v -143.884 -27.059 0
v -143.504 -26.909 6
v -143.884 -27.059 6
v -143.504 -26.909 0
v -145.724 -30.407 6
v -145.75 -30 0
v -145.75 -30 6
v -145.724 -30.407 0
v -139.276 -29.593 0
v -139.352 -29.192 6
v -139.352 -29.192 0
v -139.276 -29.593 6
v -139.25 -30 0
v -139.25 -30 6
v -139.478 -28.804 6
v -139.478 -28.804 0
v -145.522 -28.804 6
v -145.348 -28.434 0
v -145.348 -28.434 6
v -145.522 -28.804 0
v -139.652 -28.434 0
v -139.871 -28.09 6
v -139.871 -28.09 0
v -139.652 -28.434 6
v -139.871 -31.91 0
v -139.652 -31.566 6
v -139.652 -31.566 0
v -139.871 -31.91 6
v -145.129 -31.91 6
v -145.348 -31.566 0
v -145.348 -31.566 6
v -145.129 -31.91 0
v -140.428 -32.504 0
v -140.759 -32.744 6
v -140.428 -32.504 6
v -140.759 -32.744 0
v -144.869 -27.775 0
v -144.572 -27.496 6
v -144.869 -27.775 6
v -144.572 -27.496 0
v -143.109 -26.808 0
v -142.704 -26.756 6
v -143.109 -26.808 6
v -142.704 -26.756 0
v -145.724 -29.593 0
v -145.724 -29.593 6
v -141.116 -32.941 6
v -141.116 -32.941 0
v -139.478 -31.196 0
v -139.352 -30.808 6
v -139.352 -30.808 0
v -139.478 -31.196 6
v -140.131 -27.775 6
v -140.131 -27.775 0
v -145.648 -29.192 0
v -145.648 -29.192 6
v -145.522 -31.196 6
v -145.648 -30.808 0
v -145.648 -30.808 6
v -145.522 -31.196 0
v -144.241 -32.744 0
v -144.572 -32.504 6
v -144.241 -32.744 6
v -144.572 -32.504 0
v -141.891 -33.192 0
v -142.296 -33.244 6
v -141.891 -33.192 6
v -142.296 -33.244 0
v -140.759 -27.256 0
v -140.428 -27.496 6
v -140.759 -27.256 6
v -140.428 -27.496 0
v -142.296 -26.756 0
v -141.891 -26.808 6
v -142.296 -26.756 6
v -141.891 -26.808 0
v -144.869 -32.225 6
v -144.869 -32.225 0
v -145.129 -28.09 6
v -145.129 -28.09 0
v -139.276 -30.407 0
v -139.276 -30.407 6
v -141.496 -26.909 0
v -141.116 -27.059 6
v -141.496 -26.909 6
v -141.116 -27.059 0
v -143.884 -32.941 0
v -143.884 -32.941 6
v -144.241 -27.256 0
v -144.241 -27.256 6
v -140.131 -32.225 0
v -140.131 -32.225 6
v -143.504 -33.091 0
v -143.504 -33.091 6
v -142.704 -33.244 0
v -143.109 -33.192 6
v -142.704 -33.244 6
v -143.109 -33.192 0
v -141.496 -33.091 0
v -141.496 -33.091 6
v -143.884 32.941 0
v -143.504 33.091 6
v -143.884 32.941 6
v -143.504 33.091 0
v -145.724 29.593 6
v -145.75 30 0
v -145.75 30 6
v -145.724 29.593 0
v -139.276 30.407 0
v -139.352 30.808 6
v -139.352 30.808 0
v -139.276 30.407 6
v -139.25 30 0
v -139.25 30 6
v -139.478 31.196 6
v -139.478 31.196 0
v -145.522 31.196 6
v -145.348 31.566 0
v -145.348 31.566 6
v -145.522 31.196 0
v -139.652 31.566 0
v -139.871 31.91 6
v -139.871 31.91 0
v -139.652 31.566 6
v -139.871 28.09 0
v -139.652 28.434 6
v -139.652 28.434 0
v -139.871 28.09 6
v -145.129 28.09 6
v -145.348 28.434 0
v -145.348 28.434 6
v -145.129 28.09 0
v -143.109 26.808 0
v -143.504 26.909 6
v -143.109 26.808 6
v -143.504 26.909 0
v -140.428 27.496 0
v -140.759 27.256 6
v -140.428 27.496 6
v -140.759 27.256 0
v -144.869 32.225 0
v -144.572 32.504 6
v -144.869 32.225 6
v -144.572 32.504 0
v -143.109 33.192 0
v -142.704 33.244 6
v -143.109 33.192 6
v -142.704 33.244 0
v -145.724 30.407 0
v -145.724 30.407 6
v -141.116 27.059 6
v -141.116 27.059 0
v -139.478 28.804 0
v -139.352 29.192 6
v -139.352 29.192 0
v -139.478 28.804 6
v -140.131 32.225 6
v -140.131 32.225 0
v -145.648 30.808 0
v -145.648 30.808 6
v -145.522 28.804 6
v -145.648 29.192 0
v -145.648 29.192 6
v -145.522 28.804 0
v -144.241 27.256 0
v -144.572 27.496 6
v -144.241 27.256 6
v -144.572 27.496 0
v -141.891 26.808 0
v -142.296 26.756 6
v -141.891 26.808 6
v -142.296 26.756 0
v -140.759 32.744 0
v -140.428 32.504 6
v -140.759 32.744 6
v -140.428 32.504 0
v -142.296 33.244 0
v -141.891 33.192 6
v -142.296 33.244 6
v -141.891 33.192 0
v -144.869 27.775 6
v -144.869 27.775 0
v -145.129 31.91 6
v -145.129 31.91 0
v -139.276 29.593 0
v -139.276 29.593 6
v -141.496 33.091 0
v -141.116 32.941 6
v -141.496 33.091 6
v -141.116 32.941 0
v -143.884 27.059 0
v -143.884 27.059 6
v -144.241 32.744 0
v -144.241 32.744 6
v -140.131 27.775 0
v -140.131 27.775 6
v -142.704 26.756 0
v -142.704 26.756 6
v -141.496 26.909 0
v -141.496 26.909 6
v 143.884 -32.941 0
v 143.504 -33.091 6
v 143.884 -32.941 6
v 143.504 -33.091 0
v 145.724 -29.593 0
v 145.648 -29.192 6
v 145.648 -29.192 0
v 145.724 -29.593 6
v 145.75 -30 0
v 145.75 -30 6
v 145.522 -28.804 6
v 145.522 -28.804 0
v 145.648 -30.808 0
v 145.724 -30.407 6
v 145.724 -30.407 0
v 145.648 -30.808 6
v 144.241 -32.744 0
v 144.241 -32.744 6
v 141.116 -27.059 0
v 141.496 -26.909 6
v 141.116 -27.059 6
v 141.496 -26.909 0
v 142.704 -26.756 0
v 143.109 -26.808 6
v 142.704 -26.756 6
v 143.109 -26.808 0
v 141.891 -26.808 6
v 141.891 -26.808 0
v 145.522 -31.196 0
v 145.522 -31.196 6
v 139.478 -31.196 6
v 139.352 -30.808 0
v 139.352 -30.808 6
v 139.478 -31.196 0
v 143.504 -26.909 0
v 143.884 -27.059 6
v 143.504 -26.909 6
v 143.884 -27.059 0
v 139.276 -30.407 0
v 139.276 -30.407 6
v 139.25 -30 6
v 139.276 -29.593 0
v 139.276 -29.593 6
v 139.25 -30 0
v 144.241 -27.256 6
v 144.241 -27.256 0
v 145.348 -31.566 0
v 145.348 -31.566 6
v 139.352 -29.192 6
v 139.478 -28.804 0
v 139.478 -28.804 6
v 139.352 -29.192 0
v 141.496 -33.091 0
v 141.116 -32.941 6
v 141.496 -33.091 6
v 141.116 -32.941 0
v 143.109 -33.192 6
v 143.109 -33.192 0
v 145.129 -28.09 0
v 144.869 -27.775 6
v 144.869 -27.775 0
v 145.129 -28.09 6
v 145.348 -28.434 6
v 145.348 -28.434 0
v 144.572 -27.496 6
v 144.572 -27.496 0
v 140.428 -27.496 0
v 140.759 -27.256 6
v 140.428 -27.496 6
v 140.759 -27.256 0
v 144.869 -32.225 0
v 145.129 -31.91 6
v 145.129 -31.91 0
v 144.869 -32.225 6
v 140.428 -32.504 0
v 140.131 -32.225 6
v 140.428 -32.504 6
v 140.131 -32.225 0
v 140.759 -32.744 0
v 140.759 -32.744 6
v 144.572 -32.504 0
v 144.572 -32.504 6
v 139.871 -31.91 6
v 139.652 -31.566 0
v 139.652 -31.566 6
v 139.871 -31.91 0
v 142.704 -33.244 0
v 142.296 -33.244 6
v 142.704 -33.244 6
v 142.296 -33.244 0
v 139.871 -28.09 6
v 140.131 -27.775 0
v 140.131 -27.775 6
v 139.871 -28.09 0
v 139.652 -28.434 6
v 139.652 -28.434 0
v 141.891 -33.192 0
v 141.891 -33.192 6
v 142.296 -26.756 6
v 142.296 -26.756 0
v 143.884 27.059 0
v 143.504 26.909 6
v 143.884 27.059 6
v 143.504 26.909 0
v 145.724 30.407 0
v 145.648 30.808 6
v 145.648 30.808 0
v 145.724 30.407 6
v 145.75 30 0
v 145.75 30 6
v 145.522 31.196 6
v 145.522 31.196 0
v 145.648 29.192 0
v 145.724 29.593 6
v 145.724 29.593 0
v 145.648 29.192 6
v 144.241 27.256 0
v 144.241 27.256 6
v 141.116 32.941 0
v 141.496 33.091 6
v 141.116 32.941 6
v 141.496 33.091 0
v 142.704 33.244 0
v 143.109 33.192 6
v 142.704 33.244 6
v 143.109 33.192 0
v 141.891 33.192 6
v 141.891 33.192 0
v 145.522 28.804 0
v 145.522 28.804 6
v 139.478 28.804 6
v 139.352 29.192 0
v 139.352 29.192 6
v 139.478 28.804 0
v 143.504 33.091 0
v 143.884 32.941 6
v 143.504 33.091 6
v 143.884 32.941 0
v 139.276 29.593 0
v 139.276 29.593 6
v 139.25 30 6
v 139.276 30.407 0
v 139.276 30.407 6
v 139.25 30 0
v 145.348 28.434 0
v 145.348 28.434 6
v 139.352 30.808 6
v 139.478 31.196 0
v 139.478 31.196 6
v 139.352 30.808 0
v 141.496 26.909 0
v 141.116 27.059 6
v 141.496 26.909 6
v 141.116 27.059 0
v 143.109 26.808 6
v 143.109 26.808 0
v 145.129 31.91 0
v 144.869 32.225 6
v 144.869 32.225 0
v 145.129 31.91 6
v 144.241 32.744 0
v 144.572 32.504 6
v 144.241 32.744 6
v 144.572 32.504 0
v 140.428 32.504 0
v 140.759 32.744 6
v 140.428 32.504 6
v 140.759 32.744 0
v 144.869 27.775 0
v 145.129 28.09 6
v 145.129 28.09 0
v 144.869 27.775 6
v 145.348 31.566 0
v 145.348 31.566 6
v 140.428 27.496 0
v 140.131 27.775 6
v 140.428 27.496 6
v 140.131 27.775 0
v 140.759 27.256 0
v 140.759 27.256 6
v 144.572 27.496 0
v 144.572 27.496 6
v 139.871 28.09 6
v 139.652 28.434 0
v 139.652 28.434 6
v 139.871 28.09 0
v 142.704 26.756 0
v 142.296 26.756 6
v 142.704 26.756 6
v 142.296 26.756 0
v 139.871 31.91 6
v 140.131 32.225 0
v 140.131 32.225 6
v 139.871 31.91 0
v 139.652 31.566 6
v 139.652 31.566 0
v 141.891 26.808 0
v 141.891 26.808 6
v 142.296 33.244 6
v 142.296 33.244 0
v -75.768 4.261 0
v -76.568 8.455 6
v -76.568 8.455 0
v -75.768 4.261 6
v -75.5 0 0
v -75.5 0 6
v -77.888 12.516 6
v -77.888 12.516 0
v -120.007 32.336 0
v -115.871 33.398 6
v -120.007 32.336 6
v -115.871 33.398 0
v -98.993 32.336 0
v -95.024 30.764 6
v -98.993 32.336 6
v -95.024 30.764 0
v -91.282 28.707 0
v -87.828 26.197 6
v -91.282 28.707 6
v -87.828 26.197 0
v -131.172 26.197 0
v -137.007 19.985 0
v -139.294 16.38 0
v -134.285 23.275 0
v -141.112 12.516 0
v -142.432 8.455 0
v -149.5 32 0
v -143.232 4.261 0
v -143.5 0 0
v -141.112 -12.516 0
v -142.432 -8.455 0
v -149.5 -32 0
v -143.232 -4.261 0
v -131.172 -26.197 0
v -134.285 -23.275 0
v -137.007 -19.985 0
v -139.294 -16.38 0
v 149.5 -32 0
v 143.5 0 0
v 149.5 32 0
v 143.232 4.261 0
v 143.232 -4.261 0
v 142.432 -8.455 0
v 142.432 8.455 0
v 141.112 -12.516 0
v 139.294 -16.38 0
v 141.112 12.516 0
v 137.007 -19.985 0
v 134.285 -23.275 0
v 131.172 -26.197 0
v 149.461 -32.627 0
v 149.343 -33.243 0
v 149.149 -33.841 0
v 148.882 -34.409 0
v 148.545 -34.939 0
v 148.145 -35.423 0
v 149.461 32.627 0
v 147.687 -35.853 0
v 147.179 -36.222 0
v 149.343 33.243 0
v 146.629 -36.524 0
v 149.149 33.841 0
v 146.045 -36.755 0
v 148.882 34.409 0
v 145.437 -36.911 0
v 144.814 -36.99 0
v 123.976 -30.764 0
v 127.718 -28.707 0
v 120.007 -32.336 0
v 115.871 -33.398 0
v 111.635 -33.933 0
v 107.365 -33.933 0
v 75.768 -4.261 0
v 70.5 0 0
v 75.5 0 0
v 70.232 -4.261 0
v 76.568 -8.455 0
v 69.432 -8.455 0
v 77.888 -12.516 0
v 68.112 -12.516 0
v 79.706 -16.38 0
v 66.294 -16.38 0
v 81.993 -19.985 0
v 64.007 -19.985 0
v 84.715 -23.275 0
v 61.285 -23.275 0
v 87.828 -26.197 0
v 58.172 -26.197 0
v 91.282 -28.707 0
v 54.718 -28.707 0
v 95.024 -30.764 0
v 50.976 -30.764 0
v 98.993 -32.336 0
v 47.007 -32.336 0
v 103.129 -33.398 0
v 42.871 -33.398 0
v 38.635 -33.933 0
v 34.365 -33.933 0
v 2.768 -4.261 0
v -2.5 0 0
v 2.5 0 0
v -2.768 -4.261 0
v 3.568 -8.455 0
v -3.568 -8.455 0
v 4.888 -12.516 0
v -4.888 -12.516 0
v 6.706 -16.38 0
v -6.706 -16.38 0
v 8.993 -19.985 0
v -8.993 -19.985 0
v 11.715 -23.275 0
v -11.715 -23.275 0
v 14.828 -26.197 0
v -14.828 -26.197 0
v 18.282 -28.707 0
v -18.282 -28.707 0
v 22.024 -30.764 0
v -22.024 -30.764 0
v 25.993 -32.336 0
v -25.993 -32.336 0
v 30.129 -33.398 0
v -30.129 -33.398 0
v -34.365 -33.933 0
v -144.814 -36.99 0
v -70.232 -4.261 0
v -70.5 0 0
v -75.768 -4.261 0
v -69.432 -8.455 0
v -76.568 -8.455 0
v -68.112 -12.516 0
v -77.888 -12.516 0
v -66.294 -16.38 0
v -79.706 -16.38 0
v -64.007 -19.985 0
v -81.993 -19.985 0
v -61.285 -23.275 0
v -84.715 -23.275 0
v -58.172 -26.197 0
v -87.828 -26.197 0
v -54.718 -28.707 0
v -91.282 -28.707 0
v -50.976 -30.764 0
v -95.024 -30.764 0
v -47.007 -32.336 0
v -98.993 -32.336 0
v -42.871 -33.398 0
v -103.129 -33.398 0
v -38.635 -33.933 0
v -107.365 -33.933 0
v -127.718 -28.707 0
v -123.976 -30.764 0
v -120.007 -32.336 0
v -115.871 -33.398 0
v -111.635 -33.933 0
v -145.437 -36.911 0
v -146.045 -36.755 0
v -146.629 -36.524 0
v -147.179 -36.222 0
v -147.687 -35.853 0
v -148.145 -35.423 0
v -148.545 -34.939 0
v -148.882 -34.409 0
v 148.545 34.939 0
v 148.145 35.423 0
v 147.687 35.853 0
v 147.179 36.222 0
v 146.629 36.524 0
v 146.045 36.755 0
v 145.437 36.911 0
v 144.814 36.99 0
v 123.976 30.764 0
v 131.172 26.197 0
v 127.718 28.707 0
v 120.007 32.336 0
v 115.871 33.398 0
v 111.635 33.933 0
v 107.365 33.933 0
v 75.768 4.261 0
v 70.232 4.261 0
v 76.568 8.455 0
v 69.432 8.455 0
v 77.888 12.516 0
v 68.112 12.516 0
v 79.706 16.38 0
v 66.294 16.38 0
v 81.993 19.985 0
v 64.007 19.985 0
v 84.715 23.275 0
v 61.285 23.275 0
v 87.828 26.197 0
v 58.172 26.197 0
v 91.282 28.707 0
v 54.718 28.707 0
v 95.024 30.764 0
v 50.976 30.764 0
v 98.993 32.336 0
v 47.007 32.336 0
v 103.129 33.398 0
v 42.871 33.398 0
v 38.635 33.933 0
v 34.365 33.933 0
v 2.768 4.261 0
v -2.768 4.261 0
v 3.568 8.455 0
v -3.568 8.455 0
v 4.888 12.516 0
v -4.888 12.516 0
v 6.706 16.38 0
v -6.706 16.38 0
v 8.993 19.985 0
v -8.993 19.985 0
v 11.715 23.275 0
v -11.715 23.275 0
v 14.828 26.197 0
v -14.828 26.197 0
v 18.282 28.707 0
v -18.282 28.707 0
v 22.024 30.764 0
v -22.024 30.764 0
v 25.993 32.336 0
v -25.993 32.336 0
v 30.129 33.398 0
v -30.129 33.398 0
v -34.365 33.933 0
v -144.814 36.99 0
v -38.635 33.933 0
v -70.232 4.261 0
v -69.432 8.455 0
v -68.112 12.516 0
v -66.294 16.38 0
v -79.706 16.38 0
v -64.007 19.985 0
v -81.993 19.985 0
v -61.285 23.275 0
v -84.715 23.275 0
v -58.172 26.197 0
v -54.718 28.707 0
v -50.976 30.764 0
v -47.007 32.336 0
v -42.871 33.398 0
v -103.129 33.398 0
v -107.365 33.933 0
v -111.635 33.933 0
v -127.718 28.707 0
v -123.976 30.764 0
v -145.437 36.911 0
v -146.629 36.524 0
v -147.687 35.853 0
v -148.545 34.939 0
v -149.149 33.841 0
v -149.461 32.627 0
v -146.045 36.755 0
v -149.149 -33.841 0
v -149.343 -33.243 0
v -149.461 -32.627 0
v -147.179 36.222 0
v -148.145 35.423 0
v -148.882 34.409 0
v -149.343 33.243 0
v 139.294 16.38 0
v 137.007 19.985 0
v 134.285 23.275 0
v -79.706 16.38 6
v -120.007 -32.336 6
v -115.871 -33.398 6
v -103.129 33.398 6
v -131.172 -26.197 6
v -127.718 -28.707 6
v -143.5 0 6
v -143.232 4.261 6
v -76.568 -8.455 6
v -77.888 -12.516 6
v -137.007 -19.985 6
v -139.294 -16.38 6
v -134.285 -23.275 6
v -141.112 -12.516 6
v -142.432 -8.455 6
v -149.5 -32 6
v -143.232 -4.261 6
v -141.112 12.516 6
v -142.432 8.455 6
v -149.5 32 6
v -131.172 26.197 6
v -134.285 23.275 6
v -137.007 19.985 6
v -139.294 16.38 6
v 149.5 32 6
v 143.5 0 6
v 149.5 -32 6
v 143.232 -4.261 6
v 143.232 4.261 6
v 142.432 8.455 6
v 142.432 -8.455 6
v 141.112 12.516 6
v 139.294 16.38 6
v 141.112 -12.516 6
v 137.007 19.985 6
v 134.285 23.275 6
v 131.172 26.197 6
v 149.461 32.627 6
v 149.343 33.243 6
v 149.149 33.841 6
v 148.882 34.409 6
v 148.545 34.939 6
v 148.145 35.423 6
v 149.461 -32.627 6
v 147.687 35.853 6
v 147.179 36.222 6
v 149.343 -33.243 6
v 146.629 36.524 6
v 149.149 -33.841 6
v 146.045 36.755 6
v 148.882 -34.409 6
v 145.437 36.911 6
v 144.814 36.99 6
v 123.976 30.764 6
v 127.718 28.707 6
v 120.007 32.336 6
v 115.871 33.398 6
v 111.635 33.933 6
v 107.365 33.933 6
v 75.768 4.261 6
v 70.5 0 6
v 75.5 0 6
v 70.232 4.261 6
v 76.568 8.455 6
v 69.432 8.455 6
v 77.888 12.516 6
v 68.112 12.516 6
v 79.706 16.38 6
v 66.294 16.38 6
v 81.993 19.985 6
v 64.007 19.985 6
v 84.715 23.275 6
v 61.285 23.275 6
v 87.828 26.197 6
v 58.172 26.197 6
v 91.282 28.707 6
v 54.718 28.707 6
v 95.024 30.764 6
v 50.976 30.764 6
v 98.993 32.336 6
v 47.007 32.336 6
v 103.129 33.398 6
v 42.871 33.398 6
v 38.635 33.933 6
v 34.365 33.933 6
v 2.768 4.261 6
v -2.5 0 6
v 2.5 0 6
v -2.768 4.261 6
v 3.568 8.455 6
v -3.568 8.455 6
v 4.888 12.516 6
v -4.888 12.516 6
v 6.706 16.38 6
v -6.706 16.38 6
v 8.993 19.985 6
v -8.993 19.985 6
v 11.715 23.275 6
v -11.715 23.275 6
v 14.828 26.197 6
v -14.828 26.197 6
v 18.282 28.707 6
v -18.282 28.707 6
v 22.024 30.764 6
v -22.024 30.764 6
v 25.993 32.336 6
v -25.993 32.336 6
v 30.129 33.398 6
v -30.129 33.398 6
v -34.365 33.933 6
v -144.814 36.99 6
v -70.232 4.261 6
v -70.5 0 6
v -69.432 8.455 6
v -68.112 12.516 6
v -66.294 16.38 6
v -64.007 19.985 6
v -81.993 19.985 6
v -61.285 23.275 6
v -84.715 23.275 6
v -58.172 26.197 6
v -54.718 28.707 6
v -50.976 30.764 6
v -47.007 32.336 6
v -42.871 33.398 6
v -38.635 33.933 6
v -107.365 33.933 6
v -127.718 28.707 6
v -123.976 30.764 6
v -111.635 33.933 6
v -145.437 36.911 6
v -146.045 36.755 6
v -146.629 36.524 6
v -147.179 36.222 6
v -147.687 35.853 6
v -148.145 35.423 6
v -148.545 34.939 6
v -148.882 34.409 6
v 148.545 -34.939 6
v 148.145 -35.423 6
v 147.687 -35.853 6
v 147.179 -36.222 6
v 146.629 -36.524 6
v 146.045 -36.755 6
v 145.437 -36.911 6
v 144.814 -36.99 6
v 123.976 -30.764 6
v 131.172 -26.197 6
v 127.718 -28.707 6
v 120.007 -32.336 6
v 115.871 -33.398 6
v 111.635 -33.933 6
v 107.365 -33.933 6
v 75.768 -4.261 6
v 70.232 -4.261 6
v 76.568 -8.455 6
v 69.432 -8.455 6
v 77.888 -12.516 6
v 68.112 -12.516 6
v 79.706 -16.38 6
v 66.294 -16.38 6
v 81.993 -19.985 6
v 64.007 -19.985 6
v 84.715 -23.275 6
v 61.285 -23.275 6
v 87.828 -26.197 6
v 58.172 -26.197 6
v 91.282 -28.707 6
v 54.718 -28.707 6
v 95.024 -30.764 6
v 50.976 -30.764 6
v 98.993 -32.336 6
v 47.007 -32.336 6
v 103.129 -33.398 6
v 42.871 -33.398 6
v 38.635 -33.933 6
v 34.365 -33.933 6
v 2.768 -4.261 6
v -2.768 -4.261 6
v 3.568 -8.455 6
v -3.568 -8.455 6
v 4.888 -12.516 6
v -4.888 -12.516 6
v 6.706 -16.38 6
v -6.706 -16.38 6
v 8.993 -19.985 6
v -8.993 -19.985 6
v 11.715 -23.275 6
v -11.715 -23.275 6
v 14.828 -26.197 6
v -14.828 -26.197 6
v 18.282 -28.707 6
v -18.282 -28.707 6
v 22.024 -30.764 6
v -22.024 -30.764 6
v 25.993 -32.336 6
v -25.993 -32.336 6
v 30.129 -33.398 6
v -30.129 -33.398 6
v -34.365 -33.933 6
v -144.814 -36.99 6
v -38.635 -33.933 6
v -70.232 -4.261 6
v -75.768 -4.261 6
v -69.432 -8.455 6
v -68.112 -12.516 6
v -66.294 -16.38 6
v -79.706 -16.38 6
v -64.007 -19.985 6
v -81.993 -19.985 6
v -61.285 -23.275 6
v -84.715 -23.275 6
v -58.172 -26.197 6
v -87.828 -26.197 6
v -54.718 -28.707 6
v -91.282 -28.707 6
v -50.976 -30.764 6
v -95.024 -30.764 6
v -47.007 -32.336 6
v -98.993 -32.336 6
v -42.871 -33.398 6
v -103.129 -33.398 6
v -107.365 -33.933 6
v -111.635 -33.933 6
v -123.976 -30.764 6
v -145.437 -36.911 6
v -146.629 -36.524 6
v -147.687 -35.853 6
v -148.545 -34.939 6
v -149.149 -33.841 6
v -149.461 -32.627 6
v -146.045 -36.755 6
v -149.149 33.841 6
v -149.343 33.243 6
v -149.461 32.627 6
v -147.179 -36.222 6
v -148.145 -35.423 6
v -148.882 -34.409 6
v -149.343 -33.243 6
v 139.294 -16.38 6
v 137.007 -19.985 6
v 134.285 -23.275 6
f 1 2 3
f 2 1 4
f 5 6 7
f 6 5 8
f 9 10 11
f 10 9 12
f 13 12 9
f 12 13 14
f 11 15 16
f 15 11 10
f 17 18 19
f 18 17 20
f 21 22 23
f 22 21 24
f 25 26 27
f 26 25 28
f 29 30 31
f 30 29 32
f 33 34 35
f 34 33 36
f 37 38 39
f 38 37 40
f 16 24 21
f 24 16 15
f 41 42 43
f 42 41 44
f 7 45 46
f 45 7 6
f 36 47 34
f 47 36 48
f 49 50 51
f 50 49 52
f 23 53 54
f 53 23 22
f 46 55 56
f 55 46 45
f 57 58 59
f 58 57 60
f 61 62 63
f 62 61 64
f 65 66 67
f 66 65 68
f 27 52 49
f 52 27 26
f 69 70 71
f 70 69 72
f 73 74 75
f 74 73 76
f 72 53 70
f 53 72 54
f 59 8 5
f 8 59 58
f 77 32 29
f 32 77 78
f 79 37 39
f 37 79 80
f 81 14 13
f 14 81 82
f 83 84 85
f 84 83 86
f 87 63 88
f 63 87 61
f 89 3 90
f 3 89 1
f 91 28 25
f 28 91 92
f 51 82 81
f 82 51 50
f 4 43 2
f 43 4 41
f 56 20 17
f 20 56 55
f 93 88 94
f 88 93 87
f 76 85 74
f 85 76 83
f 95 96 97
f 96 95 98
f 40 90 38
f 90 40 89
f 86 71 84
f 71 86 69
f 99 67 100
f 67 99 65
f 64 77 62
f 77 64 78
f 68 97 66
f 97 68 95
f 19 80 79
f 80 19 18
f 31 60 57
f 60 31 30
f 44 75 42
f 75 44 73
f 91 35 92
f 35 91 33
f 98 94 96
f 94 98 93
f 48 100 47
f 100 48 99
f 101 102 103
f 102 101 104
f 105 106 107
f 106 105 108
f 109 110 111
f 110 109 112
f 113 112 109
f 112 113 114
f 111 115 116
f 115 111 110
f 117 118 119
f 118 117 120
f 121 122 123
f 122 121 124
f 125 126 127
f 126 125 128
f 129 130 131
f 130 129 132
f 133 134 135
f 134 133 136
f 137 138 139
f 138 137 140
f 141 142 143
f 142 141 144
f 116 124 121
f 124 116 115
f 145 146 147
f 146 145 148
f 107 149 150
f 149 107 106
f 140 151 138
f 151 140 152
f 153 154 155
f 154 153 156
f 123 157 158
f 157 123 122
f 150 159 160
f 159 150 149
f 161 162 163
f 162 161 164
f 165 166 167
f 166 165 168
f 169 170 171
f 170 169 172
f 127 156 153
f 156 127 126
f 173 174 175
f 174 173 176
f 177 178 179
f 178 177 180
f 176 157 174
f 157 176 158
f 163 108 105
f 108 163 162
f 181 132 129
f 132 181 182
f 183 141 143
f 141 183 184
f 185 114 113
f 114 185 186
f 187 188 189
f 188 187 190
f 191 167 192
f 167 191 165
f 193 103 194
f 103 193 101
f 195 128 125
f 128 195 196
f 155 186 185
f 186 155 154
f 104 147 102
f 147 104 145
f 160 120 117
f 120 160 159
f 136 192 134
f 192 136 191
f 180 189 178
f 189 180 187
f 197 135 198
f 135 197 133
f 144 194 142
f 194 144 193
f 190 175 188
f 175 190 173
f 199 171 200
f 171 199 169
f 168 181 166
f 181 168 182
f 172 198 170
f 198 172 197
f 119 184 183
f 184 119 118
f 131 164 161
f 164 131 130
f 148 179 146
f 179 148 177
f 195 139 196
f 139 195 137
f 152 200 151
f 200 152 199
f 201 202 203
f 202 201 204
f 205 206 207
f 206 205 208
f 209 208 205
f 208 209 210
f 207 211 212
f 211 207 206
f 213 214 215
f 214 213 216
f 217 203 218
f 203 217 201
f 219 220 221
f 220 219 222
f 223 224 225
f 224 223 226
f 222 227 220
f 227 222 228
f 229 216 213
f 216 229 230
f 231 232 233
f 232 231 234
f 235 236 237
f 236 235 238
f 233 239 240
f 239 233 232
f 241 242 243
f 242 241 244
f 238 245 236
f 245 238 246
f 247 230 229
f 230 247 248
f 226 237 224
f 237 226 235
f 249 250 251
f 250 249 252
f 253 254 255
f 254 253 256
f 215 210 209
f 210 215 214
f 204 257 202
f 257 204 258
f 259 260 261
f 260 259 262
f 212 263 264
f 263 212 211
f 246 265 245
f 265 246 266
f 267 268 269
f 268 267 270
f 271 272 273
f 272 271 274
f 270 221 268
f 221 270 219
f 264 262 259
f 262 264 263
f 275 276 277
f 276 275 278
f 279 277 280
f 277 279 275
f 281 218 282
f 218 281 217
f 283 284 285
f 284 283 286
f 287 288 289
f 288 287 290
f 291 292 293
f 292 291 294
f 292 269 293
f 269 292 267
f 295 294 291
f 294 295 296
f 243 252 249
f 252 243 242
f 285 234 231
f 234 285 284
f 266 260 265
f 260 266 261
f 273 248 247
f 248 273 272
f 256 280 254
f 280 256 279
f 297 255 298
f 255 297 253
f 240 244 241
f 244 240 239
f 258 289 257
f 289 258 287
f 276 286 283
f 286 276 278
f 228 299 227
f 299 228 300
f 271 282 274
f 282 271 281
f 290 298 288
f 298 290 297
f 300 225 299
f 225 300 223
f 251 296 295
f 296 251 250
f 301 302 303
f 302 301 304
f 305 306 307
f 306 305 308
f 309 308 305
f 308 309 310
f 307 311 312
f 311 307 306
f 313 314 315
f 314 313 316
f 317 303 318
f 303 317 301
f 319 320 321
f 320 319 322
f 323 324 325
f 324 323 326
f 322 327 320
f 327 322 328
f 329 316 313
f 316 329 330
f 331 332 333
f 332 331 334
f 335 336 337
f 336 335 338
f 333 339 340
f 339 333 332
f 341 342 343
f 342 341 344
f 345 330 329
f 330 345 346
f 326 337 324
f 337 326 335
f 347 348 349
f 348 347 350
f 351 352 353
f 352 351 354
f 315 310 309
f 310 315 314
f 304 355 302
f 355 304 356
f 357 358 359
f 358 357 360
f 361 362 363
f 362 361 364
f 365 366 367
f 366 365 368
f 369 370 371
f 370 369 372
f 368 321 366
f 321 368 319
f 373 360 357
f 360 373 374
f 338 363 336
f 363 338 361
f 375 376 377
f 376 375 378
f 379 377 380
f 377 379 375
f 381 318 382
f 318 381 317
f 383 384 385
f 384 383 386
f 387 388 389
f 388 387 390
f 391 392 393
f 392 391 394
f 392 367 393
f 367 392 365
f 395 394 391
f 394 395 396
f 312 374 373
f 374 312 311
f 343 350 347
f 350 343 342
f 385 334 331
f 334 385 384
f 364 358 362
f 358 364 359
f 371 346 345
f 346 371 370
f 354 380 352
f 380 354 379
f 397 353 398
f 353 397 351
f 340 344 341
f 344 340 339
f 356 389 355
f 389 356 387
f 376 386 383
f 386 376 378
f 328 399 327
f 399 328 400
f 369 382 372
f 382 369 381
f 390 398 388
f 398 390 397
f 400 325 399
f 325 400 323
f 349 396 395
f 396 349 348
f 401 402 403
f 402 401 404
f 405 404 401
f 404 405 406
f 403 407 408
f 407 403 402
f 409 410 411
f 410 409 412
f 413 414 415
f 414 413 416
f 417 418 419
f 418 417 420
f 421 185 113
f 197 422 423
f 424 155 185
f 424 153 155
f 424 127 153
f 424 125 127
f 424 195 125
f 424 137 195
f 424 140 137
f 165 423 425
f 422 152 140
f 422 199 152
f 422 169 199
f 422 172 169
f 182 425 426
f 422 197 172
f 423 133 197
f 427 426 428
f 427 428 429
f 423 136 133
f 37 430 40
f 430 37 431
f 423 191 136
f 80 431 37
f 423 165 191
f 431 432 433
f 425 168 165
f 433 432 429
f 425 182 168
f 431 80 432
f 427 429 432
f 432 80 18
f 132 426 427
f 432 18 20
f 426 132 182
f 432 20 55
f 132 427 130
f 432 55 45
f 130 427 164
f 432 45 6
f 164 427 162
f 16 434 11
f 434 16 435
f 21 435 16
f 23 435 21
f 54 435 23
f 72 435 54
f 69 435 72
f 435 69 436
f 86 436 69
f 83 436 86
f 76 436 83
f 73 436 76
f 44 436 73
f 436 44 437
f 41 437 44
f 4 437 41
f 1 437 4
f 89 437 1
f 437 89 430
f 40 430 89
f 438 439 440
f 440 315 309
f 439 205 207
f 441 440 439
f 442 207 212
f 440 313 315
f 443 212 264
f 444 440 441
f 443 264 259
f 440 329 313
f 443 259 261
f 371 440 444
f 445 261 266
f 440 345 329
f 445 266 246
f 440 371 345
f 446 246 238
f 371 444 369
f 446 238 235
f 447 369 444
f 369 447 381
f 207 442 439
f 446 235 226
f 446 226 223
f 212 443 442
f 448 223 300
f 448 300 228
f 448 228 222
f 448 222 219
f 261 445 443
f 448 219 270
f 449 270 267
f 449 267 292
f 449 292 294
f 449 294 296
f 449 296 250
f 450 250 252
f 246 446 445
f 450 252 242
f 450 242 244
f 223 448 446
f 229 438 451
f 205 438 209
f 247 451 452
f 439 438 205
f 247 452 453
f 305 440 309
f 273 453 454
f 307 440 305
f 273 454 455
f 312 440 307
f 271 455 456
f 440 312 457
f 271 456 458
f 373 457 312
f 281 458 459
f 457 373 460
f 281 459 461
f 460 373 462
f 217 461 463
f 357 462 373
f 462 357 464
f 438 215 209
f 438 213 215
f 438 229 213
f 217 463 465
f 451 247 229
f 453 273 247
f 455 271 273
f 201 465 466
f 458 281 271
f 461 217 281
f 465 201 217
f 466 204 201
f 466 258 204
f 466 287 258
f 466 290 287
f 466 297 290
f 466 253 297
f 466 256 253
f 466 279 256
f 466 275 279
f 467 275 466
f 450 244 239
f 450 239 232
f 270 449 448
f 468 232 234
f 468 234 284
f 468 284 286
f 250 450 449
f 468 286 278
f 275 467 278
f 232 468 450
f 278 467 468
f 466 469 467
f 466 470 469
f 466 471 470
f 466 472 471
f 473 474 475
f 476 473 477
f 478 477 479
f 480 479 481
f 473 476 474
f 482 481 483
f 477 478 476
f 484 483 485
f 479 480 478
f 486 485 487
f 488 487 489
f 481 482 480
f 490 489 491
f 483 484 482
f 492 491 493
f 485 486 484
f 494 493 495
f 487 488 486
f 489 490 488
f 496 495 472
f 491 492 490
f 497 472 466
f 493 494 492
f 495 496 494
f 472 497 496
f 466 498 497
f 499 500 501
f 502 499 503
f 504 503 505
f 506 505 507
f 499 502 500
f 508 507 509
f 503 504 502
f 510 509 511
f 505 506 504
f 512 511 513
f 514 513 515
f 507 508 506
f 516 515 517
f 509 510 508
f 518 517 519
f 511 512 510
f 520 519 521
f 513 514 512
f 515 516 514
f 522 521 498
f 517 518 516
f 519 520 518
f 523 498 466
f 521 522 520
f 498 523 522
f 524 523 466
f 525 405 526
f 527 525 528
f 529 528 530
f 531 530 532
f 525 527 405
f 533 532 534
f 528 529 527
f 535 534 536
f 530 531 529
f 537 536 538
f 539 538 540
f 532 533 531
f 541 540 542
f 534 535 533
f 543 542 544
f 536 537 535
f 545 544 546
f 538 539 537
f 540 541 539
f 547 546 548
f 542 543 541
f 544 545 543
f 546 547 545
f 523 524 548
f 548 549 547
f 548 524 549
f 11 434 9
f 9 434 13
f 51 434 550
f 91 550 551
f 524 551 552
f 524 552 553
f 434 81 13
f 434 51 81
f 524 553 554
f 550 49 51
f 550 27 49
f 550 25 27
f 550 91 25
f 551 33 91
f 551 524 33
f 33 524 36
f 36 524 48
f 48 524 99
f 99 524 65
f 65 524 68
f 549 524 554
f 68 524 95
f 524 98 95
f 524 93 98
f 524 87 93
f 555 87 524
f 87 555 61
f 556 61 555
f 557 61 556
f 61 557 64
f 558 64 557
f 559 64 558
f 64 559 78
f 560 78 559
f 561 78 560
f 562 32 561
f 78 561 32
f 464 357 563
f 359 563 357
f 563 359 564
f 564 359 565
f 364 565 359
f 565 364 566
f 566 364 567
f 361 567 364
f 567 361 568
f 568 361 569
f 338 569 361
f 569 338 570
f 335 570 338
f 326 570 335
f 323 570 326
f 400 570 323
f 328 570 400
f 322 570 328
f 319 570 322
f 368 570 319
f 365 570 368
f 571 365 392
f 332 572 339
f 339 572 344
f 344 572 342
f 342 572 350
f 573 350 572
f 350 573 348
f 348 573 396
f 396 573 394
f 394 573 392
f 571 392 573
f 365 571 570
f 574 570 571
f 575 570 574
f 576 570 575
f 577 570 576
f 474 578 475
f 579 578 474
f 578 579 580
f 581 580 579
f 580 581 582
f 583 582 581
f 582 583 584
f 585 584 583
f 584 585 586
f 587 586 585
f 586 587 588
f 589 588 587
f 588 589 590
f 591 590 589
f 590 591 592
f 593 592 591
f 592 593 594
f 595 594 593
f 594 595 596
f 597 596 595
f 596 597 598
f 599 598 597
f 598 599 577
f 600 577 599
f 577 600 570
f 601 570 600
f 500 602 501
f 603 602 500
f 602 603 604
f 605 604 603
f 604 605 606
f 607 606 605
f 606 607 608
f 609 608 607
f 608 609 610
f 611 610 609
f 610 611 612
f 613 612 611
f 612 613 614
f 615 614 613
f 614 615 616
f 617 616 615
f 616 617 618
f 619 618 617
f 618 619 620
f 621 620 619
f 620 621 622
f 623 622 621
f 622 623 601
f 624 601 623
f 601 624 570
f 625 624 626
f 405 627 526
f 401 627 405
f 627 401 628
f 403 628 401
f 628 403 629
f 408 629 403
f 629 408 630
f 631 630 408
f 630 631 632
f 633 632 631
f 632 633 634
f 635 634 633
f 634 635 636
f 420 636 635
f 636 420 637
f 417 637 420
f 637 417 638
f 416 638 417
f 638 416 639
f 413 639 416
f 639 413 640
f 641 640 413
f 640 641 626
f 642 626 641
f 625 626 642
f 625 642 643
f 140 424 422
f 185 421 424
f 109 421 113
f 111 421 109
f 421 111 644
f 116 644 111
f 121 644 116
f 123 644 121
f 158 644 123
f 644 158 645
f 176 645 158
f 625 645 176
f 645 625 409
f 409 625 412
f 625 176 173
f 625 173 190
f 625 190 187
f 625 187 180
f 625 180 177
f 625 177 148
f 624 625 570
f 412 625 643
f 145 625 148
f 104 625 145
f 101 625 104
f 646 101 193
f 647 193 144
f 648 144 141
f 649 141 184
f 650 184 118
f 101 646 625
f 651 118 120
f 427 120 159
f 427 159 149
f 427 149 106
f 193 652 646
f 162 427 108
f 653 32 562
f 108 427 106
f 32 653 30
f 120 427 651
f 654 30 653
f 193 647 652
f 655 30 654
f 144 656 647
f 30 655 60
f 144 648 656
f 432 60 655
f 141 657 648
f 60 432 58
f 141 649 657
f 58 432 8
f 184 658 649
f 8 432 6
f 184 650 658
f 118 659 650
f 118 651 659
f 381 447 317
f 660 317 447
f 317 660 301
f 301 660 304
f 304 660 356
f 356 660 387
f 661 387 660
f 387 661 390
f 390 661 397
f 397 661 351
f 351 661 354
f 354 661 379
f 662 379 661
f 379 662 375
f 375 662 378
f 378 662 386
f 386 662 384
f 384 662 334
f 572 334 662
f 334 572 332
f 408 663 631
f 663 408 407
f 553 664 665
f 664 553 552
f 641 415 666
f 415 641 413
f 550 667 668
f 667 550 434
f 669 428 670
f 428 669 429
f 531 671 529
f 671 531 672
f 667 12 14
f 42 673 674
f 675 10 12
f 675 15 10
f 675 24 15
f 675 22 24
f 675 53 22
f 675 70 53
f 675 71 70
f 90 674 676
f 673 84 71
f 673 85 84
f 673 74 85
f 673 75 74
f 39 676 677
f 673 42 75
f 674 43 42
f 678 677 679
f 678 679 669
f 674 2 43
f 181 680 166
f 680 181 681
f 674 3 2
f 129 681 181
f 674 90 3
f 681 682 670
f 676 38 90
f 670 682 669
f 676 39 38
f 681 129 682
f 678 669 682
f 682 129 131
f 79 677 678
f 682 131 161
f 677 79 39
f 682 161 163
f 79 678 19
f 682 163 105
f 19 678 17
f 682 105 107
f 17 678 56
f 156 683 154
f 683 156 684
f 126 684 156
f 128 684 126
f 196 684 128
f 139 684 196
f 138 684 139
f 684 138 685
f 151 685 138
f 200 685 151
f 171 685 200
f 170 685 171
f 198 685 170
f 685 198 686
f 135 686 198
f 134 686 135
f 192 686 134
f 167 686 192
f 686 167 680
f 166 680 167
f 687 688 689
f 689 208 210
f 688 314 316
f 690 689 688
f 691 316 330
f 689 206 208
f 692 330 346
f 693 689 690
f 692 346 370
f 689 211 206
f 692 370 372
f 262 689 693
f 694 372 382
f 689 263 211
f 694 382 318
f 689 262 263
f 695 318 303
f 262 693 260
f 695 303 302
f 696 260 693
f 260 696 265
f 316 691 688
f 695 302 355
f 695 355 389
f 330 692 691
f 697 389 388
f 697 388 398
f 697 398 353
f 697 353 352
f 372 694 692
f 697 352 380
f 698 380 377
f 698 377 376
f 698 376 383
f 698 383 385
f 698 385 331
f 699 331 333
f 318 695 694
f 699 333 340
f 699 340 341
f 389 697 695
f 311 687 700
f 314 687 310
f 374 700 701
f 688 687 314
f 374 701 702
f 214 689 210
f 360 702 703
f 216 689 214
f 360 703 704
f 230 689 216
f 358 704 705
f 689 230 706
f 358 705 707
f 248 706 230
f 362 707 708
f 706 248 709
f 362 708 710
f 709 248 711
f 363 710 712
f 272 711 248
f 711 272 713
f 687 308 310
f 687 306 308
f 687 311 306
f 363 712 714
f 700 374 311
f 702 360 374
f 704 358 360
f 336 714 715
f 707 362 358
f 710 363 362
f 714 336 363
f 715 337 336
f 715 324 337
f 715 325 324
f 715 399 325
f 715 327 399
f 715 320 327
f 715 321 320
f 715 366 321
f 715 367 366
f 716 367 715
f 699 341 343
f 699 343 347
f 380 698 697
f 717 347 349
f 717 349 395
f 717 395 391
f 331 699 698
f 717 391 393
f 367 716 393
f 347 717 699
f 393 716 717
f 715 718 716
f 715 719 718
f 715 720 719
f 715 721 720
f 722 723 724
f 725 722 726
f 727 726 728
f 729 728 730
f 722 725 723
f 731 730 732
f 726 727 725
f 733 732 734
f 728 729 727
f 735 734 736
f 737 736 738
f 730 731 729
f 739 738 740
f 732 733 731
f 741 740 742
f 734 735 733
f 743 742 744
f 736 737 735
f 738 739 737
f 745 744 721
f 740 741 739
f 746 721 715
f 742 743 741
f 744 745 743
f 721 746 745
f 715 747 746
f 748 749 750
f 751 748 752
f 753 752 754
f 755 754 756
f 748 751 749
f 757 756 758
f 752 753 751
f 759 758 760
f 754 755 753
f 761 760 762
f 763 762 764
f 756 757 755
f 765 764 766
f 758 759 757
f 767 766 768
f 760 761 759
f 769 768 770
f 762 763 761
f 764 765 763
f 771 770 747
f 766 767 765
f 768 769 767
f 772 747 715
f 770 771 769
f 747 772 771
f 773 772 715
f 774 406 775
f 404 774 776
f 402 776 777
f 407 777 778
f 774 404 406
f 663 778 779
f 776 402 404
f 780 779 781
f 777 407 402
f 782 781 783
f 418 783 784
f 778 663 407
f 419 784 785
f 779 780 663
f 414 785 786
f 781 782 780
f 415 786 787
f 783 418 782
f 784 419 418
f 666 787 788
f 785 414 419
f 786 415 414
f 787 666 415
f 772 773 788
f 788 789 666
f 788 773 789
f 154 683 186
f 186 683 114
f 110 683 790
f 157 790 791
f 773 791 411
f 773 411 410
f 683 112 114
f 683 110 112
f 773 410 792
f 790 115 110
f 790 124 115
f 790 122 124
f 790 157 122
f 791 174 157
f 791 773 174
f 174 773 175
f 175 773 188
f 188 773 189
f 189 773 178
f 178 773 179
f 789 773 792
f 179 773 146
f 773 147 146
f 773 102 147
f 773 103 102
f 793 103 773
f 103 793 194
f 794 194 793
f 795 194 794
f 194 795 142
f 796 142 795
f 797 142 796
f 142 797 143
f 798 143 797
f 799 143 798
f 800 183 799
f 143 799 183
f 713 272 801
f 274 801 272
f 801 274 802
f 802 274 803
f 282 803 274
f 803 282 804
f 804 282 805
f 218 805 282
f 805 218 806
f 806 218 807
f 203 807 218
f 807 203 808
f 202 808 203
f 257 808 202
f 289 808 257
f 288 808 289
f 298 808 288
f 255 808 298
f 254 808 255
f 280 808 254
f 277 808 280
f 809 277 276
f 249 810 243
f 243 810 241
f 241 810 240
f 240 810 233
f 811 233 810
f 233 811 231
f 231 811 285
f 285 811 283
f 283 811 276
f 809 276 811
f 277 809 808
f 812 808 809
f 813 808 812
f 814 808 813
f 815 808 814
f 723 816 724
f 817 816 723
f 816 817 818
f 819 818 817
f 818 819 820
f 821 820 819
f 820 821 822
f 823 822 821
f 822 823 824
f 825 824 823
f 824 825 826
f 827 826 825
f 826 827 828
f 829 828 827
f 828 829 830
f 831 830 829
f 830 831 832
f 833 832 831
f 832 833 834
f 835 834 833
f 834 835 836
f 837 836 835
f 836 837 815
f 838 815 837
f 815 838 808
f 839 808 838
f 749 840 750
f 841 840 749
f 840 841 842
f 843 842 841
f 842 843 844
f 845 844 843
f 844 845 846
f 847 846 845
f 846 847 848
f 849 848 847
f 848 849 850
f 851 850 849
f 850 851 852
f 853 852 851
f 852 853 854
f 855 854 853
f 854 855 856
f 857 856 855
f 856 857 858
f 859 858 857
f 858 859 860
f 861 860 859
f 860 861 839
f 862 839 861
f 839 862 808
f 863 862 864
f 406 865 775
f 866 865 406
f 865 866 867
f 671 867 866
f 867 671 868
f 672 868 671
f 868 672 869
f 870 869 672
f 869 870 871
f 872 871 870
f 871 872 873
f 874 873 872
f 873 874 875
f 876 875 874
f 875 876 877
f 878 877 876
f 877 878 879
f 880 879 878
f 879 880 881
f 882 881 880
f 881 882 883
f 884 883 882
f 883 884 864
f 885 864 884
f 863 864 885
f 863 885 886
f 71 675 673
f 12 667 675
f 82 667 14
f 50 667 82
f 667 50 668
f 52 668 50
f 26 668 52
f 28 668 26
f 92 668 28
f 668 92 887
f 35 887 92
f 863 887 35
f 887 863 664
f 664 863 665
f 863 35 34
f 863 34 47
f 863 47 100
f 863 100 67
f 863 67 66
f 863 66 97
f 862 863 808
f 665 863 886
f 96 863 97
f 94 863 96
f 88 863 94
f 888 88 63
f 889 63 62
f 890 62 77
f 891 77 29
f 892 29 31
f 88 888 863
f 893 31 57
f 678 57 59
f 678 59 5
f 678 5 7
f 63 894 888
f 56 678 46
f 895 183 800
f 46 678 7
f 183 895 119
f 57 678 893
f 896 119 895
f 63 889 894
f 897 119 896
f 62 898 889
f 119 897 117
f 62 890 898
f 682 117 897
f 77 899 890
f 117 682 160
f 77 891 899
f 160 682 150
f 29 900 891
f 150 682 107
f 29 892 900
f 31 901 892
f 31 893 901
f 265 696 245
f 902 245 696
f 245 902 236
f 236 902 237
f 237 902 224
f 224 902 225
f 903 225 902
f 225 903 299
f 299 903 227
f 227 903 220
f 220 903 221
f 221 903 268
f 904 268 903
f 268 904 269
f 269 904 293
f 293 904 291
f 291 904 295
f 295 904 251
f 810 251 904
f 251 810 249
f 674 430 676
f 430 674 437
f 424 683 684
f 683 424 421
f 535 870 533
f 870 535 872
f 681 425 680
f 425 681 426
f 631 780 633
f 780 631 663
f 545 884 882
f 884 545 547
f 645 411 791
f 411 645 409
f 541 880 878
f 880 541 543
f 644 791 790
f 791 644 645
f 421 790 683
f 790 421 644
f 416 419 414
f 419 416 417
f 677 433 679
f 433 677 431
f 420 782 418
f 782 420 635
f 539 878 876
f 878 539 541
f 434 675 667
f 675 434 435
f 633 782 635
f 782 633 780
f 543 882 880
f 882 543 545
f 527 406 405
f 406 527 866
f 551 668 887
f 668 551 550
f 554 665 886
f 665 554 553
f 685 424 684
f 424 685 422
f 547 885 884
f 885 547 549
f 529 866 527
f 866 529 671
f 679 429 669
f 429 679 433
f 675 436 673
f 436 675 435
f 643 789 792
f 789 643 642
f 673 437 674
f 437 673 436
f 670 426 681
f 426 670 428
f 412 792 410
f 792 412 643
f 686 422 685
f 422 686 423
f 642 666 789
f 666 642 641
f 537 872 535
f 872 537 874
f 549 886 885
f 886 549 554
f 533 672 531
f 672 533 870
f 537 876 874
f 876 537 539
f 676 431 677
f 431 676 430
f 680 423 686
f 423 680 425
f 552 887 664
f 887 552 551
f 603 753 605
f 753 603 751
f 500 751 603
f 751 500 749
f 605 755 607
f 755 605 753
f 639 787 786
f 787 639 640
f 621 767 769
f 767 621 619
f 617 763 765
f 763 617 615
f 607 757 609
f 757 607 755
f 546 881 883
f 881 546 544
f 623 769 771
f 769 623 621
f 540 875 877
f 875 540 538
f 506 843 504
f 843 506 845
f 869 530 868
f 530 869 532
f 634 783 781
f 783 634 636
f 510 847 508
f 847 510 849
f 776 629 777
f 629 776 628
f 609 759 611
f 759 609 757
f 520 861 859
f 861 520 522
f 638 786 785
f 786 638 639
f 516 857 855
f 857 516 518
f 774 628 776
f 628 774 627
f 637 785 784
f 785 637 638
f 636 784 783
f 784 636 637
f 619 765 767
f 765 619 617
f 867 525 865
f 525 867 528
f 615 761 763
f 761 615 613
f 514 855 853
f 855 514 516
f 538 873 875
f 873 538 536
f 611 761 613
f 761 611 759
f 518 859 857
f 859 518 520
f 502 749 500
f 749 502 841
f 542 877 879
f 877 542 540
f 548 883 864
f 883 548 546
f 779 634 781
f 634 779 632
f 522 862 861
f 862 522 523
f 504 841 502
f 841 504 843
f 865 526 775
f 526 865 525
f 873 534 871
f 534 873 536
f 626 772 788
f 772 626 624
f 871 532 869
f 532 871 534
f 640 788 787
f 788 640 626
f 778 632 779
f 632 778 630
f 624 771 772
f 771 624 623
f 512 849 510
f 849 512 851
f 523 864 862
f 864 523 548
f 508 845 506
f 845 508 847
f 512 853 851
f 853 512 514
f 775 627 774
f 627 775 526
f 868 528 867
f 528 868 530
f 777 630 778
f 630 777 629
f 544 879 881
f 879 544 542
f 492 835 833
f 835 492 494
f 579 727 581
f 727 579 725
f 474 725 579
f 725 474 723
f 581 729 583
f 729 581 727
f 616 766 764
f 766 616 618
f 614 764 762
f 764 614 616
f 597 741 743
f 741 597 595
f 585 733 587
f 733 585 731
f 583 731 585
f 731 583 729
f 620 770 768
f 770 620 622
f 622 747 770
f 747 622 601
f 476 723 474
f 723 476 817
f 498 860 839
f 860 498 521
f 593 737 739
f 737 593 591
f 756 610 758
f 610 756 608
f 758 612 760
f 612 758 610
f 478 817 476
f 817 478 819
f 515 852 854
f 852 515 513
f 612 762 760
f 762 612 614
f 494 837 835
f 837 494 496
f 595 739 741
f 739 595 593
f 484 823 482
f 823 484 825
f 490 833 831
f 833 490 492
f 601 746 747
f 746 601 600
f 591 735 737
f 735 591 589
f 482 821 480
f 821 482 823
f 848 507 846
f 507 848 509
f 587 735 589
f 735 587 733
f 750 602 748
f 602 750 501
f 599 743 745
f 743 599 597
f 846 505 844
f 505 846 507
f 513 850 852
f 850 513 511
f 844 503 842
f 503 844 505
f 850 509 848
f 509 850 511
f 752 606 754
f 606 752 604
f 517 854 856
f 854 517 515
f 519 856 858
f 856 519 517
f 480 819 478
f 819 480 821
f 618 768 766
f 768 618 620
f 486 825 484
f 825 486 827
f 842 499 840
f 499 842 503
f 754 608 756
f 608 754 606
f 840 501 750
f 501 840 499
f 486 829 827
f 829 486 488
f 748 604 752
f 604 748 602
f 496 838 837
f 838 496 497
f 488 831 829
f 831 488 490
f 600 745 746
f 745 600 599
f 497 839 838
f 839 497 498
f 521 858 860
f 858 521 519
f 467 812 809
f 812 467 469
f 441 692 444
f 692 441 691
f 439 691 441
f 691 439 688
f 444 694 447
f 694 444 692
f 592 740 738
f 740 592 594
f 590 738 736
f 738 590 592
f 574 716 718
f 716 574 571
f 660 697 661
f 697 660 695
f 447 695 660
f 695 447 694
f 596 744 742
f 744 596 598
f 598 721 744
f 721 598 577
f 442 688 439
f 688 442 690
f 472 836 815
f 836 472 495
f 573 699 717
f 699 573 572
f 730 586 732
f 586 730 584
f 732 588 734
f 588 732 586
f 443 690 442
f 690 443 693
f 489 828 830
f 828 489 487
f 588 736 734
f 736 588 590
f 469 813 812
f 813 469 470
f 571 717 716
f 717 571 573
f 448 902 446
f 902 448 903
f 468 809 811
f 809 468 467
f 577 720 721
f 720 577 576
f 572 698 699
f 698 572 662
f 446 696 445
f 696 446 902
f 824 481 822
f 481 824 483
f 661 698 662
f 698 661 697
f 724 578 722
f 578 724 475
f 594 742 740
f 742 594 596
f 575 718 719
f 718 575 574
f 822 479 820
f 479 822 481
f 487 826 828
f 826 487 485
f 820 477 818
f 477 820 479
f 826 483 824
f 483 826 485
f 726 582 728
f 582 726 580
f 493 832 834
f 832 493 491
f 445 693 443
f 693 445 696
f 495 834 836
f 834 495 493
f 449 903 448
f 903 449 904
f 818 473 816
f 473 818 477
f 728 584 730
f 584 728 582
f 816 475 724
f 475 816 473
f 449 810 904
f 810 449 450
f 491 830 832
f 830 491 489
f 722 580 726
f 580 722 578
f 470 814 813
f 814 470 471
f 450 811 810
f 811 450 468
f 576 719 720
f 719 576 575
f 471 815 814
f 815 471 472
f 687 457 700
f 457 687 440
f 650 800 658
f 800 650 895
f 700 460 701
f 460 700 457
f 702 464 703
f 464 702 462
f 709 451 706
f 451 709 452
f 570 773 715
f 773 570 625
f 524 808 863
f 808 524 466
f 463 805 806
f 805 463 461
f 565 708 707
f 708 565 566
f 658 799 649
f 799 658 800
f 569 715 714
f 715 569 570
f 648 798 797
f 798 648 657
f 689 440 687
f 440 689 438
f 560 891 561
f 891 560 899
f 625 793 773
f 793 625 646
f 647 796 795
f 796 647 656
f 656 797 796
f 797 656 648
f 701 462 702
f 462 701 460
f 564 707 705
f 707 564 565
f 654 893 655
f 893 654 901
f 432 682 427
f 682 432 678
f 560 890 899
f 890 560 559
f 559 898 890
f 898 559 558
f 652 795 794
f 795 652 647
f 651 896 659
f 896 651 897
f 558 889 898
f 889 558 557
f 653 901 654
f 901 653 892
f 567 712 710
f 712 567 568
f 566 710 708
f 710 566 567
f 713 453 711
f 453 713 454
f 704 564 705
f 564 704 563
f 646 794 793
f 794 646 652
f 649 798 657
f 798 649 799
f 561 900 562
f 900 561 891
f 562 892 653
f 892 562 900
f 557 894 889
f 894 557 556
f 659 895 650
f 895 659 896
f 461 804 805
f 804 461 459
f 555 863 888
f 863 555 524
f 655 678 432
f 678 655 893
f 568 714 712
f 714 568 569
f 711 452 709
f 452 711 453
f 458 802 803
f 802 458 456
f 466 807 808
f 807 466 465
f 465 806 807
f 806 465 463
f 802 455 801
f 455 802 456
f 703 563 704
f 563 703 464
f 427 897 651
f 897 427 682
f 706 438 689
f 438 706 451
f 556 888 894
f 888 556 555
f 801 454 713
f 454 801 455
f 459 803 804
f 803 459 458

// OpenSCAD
$fn = 50;


difference() {
	union() {
		hull() {
			translate(v = [-144.5000000000, 32.0000000000, 0]) {
				cylinder(h = 6, r = 5);
			}
			translate(v = [144.5000000000, 32.0000000000, 0]) {
				cylinder(h = 6, r = 5);
			}
			translate(v = [-144.5000000000, -32.0000000000, 0]) {
				cylinder(h = 6, r = 5);
			}
			translate(v = [144.5000000000, -32.0000000000, 0]) {
				cylinder(h = 6, r = 5);
			}
		}
	}
	union() {
		#translate(v = [-142.5000000000, -30.0000000000, -100.0000000000]) {
			cylinder(h = 200, r = 3.2500000000);
		}
		#translate(v = [-142.5000000000, 30.0000000000, -100.0000000000]) {
			cylinder(h = 200, r = 3.2500000000);
		}
		#translate(v = [142.5000000000, -30.0000000000, -100.0000000000]) {
			cylinder(h = 200, r = 3.2500000000);
		}
		#translate(v = [142.5000000000, 30.0000000000, -100.0000000000]) {
			cylinder(h = 200, r = 3.2500000000);
		}
		#translate(v = [-109.5000000000, 0, 0]) {
			cylinder(h = 6, r = 34.0000000000);
		}
		#translate(v = [-36.5000000000, 0, 0]) {
			cylinder(h = 6, r = 34.0000000000);
		}
		#translate(v = [36.5000000000, 0, 0]) {
			cylinder(h = 6, r = 34.0000000000);
		}
		#translate(v = [109.5000000000, 0, 0]) {
			cylinder(h = 6, r = 34.0000000000);
		}
	}
}
